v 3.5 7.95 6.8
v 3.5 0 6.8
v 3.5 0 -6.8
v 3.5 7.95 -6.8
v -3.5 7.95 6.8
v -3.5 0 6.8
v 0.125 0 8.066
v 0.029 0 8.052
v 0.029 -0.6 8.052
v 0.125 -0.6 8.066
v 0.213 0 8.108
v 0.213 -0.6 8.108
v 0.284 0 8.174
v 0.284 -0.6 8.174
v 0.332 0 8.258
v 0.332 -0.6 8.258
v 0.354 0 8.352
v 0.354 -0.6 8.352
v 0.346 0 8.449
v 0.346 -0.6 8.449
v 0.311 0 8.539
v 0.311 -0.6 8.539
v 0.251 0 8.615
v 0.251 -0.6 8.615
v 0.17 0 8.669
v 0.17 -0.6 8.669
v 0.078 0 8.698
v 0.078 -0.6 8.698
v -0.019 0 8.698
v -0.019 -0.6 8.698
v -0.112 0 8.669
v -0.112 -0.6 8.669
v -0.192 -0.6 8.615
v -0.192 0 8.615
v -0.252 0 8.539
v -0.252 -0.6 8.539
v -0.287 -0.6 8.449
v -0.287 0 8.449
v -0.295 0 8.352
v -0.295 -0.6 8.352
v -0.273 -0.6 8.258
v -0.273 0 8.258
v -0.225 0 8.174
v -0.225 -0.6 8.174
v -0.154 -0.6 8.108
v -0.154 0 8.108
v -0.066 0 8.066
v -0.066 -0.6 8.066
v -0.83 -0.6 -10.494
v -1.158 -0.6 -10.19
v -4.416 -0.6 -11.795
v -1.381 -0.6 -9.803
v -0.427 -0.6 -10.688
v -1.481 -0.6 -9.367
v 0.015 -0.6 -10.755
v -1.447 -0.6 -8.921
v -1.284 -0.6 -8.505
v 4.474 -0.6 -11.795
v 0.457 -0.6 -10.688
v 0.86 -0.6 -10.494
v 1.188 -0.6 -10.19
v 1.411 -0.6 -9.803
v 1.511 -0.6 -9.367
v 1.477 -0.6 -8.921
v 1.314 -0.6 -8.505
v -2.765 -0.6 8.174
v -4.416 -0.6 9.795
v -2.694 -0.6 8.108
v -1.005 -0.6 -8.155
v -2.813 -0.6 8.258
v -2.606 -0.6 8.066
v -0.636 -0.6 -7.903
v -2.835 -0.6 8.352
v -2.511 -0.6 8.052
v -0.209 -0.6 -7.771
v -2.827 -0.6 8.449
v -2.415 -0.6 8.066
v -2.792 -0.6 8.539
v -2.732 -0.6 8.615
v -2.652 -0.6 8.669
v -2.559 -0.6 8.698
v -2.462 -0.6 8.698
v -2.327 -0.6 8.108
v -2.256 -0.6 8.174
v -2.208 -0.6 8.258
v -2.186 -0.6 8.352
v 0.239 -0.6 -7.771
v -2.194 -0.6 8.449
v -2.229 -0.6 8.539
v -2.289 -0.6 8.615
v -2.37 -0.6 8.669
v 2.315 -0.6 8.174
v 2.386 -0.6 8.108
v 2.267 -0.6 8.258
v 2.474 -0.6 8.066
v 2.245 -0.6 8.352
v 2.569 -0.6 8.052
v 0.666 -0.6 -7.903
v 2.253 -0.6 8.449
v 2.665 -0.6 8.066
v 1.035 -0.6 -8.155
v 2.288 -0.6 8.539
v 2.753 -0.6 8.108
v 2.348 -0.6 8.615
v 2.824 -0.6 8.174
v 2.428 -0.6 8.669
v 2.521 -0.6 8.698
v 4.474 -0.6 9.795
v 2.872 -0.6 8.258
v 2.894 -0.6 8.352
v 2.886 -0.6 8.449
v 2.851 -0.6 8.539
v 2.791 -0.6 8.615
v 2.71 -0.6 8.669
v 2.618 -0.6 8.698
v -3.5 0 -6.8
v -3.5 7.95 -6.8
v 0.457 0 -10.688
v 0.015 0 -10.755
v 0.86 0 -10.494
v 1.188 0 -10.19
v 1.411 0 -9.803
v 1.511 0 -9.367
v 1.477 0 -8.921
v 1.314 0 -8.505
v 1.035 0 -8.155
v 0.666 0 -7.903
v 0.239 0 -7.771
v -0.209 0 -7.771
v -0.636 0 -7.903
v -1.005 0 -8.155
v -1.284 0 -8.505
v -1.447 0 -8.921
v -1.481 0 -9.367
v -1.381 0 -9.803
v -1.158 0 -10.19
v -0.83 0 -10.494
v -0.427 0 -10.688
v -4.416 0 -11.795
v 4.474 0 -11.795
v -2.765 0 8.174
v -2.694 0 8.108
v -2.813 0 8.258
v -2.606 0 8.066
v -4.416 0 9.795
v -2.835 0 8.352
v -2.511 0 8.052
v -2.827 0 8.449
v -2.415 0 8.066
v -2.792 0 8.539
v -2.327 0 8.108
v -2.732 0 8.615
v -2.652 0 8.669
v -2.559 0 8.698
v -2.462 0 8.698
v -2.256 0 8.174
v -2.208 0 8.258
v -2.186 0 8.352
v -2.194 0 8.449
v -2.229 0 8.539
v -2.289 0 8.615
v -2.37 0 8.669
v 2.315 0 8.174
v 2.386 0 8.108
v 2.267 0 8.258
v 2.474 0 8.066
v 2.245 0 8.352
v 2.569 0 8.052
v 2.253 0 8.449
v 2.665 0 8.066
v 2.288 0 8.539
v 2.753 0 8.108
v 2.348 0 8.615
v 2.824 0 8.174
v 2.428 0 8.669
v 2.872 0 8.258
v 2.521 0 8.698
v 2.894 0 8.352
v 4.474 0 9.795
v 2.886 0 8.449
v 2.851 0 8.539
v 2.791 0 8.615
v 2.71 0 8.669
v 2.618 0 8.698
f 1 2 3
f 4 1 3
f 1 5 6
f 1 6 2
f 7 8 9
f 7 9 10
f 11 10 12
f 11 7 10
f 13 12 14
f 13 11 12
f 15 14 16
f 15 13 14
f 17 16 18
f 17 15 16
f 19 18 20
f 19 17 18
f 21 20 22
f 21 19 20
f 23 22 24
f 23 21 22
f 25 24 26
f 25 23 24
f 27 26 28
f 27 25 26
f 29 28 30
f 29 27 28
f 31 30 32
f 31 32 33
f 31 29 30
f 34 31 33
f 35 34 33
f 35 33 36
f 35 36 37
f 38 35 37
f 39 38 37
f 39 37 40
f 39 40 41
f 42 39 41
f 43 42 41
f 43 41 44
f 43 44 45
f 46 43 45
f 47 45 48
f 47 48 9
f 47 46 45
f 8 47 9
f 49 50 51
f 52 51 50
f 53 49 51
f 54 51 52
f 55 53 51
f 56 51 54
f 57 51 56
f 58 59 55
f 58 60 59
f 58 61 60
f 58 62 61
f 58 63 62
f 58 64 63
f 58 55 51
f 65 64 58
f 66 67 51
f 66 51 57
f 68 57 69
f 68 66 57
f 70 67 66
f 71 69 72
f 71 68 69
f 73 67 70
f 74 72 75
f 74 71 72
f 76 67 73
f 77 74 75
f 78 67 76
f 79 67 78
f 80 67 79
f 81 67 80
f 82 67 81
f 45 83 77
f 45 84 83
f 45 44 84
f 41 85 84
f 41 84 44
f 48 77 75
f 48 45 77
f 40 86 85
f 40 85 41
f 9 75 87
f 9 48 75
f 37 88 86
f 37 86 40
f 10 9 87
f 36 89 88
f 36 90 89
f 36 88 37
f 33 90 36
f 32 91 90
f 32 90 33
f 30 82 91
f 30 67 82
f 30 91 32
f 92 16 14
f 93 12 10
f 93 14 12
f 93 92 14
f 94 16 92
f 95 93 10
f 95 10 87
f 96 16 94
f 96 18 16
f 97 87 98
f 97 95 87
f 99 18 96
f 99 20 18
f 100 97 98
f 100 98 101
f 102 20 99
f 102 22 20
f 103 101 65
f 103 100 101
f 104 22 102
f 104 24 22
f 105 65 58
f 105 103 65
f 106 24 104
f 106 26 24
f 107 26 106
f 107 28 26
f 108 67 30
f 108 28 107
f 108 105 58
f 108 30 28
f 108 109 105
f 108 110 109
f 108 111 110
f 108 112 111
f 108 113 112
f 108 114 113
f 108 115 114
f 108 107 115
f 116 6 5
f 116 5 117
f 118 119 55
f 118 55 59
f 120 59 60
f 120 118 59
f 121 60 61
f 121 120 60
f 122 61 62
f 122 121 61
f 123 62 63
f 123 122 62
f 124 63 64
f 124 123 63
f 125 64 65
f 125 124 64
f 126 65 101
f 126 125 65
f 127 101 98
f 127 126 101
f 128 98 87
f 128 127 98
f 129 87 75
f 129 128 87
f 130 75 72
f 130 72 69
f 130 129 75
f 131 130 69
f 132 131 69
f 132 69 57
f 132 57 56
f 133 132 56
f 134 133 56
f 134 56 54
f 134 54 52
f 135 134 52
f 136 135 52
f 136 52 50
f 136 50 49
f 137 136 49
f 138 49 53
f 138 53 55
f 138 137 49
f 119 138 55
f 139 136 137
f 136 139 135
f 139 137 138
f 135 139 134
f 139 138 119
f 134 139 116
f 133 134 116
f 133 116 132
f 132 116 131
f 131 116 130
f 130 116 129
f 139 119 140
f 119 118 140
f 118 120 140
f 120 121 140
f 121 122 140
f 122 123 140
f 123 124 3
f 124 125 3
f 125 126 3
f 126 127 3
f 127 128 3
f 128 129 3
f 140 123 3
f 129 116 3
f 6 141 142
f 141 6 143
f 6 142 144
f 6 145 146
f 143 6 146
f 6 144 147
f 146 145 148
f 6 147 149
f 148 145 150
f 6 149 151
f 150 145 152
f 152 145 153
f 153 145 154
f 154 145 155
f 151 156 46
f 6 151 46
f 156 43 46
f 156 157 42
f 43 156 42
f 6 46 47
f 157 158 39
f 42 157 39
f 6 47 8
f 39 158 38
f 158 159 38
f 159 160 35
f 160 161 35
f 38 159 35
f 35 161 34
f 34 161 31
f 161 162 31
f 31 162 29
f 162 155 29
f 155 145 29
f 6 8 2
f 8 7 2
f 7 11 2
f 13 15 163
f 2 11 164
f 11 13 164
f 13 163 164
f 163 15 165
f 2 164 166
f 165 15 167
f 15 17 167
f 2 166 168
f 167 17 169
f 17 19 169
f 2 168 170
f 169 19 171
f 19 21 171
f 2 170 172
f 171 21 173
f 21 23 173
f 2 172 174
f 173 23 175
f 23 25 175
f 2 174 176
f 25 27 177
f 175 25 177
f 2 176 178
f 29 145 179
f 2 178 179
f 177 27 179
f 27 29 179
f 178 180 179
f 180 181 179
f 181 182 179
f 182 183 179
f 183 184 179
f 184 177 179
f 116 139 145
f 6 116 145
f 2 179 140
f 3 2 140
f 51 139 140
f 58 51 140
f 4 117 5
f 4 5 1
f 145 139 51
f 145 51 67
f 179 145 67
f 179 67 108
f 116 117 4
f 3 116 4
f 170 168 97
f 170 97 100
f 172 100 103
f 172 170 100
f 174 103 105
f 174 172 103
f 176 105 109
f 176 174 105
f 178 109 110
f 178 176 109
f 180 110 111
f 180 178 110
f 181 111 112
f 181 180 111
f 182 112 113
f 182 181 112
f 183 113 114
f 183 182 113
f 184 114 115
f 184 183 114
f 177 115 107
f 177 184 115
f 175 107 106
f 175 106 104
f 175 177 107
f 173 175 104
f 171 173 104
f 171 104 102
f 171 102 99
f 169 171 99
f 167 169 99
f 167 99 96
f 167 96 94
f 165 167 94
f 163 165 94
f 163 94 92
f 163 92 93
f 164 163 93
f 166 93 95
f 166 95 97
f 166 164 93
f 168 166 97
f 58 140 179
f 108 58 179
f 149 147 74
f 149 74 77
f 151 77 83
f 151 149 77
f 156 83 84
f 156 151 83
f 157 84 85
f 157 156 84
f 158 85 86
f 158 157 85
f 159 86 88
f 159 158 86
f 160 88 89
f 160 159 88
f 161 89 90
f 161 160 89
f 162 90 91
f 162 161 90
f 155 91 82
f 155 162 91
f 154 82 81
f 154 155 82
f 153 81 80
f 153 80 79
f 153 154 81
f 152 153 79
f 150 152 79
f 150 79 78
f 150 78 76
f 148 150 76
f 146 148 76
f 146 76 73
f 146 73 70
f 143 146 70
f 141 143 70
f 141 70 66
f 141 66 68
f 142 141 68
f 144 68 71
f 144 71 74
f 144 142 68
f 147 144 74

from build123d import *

# Parameters (mm, degrees)
SKETCH1_W           = 7
SKETCH1_H           = 13.6
BOSS_EXTRUDE1_DEPTH = 7.95
SKETCH2_W           = 8.89
SKETCH2_H           = 21.59
SKETCH2_R           = 1.5
SKETCH2_R_2         = 0.325
BOSS_EXTRUDE2_DEPTH = 0.6


with BuildPart() as part:
    # Sketch1 → Boss-Extrude1 (new body)
    with BuildSketch(Plane(origin=(0, 0, 0), x_dir=(1, 0, 0), z_dir=(0, 1, 0))):
        Rectangle(SKETCH1_W, SKETCH1_H)
    extrude(amount=BOSS_EXTRUDE1_DEPTH)

    # Sketch2 → Boss-Extrude2 (add)
    with BuildSketch(Plane.XZ):
        with Locations((0.029445322, -0.999566393)):
            Rectangle(SKETCH2_W, SKETCH2_H)
        with Locations(Location((0.01501125, -9.254566393, 0), (0, 0, 270))):
            Circle(SKETCH2_R, mode=Mode.SUBTRACT)
        with Locations(Location((0.029445322, 8.376560571, 0), (0, 0, 270))):
            Circle(SKETCH2_R_2, mode=Mode.SUBTRACT)
        with Locations(Location((2.569445322, 8.376560571, 0), (0, 0, 270))):
            Circle(SKETCH2_R_2, mode=Mode.SUBTRACT)
        with Locations(Location((-2.510554678, 8.376560571, 0), (0, 0, 270))):
            Circle(SKETCH2_R_2, mode=Mode.SUBTRACT)
    extrude(amount=BOSS_EXTRUDE2_DEPTH)


solid = part.part
